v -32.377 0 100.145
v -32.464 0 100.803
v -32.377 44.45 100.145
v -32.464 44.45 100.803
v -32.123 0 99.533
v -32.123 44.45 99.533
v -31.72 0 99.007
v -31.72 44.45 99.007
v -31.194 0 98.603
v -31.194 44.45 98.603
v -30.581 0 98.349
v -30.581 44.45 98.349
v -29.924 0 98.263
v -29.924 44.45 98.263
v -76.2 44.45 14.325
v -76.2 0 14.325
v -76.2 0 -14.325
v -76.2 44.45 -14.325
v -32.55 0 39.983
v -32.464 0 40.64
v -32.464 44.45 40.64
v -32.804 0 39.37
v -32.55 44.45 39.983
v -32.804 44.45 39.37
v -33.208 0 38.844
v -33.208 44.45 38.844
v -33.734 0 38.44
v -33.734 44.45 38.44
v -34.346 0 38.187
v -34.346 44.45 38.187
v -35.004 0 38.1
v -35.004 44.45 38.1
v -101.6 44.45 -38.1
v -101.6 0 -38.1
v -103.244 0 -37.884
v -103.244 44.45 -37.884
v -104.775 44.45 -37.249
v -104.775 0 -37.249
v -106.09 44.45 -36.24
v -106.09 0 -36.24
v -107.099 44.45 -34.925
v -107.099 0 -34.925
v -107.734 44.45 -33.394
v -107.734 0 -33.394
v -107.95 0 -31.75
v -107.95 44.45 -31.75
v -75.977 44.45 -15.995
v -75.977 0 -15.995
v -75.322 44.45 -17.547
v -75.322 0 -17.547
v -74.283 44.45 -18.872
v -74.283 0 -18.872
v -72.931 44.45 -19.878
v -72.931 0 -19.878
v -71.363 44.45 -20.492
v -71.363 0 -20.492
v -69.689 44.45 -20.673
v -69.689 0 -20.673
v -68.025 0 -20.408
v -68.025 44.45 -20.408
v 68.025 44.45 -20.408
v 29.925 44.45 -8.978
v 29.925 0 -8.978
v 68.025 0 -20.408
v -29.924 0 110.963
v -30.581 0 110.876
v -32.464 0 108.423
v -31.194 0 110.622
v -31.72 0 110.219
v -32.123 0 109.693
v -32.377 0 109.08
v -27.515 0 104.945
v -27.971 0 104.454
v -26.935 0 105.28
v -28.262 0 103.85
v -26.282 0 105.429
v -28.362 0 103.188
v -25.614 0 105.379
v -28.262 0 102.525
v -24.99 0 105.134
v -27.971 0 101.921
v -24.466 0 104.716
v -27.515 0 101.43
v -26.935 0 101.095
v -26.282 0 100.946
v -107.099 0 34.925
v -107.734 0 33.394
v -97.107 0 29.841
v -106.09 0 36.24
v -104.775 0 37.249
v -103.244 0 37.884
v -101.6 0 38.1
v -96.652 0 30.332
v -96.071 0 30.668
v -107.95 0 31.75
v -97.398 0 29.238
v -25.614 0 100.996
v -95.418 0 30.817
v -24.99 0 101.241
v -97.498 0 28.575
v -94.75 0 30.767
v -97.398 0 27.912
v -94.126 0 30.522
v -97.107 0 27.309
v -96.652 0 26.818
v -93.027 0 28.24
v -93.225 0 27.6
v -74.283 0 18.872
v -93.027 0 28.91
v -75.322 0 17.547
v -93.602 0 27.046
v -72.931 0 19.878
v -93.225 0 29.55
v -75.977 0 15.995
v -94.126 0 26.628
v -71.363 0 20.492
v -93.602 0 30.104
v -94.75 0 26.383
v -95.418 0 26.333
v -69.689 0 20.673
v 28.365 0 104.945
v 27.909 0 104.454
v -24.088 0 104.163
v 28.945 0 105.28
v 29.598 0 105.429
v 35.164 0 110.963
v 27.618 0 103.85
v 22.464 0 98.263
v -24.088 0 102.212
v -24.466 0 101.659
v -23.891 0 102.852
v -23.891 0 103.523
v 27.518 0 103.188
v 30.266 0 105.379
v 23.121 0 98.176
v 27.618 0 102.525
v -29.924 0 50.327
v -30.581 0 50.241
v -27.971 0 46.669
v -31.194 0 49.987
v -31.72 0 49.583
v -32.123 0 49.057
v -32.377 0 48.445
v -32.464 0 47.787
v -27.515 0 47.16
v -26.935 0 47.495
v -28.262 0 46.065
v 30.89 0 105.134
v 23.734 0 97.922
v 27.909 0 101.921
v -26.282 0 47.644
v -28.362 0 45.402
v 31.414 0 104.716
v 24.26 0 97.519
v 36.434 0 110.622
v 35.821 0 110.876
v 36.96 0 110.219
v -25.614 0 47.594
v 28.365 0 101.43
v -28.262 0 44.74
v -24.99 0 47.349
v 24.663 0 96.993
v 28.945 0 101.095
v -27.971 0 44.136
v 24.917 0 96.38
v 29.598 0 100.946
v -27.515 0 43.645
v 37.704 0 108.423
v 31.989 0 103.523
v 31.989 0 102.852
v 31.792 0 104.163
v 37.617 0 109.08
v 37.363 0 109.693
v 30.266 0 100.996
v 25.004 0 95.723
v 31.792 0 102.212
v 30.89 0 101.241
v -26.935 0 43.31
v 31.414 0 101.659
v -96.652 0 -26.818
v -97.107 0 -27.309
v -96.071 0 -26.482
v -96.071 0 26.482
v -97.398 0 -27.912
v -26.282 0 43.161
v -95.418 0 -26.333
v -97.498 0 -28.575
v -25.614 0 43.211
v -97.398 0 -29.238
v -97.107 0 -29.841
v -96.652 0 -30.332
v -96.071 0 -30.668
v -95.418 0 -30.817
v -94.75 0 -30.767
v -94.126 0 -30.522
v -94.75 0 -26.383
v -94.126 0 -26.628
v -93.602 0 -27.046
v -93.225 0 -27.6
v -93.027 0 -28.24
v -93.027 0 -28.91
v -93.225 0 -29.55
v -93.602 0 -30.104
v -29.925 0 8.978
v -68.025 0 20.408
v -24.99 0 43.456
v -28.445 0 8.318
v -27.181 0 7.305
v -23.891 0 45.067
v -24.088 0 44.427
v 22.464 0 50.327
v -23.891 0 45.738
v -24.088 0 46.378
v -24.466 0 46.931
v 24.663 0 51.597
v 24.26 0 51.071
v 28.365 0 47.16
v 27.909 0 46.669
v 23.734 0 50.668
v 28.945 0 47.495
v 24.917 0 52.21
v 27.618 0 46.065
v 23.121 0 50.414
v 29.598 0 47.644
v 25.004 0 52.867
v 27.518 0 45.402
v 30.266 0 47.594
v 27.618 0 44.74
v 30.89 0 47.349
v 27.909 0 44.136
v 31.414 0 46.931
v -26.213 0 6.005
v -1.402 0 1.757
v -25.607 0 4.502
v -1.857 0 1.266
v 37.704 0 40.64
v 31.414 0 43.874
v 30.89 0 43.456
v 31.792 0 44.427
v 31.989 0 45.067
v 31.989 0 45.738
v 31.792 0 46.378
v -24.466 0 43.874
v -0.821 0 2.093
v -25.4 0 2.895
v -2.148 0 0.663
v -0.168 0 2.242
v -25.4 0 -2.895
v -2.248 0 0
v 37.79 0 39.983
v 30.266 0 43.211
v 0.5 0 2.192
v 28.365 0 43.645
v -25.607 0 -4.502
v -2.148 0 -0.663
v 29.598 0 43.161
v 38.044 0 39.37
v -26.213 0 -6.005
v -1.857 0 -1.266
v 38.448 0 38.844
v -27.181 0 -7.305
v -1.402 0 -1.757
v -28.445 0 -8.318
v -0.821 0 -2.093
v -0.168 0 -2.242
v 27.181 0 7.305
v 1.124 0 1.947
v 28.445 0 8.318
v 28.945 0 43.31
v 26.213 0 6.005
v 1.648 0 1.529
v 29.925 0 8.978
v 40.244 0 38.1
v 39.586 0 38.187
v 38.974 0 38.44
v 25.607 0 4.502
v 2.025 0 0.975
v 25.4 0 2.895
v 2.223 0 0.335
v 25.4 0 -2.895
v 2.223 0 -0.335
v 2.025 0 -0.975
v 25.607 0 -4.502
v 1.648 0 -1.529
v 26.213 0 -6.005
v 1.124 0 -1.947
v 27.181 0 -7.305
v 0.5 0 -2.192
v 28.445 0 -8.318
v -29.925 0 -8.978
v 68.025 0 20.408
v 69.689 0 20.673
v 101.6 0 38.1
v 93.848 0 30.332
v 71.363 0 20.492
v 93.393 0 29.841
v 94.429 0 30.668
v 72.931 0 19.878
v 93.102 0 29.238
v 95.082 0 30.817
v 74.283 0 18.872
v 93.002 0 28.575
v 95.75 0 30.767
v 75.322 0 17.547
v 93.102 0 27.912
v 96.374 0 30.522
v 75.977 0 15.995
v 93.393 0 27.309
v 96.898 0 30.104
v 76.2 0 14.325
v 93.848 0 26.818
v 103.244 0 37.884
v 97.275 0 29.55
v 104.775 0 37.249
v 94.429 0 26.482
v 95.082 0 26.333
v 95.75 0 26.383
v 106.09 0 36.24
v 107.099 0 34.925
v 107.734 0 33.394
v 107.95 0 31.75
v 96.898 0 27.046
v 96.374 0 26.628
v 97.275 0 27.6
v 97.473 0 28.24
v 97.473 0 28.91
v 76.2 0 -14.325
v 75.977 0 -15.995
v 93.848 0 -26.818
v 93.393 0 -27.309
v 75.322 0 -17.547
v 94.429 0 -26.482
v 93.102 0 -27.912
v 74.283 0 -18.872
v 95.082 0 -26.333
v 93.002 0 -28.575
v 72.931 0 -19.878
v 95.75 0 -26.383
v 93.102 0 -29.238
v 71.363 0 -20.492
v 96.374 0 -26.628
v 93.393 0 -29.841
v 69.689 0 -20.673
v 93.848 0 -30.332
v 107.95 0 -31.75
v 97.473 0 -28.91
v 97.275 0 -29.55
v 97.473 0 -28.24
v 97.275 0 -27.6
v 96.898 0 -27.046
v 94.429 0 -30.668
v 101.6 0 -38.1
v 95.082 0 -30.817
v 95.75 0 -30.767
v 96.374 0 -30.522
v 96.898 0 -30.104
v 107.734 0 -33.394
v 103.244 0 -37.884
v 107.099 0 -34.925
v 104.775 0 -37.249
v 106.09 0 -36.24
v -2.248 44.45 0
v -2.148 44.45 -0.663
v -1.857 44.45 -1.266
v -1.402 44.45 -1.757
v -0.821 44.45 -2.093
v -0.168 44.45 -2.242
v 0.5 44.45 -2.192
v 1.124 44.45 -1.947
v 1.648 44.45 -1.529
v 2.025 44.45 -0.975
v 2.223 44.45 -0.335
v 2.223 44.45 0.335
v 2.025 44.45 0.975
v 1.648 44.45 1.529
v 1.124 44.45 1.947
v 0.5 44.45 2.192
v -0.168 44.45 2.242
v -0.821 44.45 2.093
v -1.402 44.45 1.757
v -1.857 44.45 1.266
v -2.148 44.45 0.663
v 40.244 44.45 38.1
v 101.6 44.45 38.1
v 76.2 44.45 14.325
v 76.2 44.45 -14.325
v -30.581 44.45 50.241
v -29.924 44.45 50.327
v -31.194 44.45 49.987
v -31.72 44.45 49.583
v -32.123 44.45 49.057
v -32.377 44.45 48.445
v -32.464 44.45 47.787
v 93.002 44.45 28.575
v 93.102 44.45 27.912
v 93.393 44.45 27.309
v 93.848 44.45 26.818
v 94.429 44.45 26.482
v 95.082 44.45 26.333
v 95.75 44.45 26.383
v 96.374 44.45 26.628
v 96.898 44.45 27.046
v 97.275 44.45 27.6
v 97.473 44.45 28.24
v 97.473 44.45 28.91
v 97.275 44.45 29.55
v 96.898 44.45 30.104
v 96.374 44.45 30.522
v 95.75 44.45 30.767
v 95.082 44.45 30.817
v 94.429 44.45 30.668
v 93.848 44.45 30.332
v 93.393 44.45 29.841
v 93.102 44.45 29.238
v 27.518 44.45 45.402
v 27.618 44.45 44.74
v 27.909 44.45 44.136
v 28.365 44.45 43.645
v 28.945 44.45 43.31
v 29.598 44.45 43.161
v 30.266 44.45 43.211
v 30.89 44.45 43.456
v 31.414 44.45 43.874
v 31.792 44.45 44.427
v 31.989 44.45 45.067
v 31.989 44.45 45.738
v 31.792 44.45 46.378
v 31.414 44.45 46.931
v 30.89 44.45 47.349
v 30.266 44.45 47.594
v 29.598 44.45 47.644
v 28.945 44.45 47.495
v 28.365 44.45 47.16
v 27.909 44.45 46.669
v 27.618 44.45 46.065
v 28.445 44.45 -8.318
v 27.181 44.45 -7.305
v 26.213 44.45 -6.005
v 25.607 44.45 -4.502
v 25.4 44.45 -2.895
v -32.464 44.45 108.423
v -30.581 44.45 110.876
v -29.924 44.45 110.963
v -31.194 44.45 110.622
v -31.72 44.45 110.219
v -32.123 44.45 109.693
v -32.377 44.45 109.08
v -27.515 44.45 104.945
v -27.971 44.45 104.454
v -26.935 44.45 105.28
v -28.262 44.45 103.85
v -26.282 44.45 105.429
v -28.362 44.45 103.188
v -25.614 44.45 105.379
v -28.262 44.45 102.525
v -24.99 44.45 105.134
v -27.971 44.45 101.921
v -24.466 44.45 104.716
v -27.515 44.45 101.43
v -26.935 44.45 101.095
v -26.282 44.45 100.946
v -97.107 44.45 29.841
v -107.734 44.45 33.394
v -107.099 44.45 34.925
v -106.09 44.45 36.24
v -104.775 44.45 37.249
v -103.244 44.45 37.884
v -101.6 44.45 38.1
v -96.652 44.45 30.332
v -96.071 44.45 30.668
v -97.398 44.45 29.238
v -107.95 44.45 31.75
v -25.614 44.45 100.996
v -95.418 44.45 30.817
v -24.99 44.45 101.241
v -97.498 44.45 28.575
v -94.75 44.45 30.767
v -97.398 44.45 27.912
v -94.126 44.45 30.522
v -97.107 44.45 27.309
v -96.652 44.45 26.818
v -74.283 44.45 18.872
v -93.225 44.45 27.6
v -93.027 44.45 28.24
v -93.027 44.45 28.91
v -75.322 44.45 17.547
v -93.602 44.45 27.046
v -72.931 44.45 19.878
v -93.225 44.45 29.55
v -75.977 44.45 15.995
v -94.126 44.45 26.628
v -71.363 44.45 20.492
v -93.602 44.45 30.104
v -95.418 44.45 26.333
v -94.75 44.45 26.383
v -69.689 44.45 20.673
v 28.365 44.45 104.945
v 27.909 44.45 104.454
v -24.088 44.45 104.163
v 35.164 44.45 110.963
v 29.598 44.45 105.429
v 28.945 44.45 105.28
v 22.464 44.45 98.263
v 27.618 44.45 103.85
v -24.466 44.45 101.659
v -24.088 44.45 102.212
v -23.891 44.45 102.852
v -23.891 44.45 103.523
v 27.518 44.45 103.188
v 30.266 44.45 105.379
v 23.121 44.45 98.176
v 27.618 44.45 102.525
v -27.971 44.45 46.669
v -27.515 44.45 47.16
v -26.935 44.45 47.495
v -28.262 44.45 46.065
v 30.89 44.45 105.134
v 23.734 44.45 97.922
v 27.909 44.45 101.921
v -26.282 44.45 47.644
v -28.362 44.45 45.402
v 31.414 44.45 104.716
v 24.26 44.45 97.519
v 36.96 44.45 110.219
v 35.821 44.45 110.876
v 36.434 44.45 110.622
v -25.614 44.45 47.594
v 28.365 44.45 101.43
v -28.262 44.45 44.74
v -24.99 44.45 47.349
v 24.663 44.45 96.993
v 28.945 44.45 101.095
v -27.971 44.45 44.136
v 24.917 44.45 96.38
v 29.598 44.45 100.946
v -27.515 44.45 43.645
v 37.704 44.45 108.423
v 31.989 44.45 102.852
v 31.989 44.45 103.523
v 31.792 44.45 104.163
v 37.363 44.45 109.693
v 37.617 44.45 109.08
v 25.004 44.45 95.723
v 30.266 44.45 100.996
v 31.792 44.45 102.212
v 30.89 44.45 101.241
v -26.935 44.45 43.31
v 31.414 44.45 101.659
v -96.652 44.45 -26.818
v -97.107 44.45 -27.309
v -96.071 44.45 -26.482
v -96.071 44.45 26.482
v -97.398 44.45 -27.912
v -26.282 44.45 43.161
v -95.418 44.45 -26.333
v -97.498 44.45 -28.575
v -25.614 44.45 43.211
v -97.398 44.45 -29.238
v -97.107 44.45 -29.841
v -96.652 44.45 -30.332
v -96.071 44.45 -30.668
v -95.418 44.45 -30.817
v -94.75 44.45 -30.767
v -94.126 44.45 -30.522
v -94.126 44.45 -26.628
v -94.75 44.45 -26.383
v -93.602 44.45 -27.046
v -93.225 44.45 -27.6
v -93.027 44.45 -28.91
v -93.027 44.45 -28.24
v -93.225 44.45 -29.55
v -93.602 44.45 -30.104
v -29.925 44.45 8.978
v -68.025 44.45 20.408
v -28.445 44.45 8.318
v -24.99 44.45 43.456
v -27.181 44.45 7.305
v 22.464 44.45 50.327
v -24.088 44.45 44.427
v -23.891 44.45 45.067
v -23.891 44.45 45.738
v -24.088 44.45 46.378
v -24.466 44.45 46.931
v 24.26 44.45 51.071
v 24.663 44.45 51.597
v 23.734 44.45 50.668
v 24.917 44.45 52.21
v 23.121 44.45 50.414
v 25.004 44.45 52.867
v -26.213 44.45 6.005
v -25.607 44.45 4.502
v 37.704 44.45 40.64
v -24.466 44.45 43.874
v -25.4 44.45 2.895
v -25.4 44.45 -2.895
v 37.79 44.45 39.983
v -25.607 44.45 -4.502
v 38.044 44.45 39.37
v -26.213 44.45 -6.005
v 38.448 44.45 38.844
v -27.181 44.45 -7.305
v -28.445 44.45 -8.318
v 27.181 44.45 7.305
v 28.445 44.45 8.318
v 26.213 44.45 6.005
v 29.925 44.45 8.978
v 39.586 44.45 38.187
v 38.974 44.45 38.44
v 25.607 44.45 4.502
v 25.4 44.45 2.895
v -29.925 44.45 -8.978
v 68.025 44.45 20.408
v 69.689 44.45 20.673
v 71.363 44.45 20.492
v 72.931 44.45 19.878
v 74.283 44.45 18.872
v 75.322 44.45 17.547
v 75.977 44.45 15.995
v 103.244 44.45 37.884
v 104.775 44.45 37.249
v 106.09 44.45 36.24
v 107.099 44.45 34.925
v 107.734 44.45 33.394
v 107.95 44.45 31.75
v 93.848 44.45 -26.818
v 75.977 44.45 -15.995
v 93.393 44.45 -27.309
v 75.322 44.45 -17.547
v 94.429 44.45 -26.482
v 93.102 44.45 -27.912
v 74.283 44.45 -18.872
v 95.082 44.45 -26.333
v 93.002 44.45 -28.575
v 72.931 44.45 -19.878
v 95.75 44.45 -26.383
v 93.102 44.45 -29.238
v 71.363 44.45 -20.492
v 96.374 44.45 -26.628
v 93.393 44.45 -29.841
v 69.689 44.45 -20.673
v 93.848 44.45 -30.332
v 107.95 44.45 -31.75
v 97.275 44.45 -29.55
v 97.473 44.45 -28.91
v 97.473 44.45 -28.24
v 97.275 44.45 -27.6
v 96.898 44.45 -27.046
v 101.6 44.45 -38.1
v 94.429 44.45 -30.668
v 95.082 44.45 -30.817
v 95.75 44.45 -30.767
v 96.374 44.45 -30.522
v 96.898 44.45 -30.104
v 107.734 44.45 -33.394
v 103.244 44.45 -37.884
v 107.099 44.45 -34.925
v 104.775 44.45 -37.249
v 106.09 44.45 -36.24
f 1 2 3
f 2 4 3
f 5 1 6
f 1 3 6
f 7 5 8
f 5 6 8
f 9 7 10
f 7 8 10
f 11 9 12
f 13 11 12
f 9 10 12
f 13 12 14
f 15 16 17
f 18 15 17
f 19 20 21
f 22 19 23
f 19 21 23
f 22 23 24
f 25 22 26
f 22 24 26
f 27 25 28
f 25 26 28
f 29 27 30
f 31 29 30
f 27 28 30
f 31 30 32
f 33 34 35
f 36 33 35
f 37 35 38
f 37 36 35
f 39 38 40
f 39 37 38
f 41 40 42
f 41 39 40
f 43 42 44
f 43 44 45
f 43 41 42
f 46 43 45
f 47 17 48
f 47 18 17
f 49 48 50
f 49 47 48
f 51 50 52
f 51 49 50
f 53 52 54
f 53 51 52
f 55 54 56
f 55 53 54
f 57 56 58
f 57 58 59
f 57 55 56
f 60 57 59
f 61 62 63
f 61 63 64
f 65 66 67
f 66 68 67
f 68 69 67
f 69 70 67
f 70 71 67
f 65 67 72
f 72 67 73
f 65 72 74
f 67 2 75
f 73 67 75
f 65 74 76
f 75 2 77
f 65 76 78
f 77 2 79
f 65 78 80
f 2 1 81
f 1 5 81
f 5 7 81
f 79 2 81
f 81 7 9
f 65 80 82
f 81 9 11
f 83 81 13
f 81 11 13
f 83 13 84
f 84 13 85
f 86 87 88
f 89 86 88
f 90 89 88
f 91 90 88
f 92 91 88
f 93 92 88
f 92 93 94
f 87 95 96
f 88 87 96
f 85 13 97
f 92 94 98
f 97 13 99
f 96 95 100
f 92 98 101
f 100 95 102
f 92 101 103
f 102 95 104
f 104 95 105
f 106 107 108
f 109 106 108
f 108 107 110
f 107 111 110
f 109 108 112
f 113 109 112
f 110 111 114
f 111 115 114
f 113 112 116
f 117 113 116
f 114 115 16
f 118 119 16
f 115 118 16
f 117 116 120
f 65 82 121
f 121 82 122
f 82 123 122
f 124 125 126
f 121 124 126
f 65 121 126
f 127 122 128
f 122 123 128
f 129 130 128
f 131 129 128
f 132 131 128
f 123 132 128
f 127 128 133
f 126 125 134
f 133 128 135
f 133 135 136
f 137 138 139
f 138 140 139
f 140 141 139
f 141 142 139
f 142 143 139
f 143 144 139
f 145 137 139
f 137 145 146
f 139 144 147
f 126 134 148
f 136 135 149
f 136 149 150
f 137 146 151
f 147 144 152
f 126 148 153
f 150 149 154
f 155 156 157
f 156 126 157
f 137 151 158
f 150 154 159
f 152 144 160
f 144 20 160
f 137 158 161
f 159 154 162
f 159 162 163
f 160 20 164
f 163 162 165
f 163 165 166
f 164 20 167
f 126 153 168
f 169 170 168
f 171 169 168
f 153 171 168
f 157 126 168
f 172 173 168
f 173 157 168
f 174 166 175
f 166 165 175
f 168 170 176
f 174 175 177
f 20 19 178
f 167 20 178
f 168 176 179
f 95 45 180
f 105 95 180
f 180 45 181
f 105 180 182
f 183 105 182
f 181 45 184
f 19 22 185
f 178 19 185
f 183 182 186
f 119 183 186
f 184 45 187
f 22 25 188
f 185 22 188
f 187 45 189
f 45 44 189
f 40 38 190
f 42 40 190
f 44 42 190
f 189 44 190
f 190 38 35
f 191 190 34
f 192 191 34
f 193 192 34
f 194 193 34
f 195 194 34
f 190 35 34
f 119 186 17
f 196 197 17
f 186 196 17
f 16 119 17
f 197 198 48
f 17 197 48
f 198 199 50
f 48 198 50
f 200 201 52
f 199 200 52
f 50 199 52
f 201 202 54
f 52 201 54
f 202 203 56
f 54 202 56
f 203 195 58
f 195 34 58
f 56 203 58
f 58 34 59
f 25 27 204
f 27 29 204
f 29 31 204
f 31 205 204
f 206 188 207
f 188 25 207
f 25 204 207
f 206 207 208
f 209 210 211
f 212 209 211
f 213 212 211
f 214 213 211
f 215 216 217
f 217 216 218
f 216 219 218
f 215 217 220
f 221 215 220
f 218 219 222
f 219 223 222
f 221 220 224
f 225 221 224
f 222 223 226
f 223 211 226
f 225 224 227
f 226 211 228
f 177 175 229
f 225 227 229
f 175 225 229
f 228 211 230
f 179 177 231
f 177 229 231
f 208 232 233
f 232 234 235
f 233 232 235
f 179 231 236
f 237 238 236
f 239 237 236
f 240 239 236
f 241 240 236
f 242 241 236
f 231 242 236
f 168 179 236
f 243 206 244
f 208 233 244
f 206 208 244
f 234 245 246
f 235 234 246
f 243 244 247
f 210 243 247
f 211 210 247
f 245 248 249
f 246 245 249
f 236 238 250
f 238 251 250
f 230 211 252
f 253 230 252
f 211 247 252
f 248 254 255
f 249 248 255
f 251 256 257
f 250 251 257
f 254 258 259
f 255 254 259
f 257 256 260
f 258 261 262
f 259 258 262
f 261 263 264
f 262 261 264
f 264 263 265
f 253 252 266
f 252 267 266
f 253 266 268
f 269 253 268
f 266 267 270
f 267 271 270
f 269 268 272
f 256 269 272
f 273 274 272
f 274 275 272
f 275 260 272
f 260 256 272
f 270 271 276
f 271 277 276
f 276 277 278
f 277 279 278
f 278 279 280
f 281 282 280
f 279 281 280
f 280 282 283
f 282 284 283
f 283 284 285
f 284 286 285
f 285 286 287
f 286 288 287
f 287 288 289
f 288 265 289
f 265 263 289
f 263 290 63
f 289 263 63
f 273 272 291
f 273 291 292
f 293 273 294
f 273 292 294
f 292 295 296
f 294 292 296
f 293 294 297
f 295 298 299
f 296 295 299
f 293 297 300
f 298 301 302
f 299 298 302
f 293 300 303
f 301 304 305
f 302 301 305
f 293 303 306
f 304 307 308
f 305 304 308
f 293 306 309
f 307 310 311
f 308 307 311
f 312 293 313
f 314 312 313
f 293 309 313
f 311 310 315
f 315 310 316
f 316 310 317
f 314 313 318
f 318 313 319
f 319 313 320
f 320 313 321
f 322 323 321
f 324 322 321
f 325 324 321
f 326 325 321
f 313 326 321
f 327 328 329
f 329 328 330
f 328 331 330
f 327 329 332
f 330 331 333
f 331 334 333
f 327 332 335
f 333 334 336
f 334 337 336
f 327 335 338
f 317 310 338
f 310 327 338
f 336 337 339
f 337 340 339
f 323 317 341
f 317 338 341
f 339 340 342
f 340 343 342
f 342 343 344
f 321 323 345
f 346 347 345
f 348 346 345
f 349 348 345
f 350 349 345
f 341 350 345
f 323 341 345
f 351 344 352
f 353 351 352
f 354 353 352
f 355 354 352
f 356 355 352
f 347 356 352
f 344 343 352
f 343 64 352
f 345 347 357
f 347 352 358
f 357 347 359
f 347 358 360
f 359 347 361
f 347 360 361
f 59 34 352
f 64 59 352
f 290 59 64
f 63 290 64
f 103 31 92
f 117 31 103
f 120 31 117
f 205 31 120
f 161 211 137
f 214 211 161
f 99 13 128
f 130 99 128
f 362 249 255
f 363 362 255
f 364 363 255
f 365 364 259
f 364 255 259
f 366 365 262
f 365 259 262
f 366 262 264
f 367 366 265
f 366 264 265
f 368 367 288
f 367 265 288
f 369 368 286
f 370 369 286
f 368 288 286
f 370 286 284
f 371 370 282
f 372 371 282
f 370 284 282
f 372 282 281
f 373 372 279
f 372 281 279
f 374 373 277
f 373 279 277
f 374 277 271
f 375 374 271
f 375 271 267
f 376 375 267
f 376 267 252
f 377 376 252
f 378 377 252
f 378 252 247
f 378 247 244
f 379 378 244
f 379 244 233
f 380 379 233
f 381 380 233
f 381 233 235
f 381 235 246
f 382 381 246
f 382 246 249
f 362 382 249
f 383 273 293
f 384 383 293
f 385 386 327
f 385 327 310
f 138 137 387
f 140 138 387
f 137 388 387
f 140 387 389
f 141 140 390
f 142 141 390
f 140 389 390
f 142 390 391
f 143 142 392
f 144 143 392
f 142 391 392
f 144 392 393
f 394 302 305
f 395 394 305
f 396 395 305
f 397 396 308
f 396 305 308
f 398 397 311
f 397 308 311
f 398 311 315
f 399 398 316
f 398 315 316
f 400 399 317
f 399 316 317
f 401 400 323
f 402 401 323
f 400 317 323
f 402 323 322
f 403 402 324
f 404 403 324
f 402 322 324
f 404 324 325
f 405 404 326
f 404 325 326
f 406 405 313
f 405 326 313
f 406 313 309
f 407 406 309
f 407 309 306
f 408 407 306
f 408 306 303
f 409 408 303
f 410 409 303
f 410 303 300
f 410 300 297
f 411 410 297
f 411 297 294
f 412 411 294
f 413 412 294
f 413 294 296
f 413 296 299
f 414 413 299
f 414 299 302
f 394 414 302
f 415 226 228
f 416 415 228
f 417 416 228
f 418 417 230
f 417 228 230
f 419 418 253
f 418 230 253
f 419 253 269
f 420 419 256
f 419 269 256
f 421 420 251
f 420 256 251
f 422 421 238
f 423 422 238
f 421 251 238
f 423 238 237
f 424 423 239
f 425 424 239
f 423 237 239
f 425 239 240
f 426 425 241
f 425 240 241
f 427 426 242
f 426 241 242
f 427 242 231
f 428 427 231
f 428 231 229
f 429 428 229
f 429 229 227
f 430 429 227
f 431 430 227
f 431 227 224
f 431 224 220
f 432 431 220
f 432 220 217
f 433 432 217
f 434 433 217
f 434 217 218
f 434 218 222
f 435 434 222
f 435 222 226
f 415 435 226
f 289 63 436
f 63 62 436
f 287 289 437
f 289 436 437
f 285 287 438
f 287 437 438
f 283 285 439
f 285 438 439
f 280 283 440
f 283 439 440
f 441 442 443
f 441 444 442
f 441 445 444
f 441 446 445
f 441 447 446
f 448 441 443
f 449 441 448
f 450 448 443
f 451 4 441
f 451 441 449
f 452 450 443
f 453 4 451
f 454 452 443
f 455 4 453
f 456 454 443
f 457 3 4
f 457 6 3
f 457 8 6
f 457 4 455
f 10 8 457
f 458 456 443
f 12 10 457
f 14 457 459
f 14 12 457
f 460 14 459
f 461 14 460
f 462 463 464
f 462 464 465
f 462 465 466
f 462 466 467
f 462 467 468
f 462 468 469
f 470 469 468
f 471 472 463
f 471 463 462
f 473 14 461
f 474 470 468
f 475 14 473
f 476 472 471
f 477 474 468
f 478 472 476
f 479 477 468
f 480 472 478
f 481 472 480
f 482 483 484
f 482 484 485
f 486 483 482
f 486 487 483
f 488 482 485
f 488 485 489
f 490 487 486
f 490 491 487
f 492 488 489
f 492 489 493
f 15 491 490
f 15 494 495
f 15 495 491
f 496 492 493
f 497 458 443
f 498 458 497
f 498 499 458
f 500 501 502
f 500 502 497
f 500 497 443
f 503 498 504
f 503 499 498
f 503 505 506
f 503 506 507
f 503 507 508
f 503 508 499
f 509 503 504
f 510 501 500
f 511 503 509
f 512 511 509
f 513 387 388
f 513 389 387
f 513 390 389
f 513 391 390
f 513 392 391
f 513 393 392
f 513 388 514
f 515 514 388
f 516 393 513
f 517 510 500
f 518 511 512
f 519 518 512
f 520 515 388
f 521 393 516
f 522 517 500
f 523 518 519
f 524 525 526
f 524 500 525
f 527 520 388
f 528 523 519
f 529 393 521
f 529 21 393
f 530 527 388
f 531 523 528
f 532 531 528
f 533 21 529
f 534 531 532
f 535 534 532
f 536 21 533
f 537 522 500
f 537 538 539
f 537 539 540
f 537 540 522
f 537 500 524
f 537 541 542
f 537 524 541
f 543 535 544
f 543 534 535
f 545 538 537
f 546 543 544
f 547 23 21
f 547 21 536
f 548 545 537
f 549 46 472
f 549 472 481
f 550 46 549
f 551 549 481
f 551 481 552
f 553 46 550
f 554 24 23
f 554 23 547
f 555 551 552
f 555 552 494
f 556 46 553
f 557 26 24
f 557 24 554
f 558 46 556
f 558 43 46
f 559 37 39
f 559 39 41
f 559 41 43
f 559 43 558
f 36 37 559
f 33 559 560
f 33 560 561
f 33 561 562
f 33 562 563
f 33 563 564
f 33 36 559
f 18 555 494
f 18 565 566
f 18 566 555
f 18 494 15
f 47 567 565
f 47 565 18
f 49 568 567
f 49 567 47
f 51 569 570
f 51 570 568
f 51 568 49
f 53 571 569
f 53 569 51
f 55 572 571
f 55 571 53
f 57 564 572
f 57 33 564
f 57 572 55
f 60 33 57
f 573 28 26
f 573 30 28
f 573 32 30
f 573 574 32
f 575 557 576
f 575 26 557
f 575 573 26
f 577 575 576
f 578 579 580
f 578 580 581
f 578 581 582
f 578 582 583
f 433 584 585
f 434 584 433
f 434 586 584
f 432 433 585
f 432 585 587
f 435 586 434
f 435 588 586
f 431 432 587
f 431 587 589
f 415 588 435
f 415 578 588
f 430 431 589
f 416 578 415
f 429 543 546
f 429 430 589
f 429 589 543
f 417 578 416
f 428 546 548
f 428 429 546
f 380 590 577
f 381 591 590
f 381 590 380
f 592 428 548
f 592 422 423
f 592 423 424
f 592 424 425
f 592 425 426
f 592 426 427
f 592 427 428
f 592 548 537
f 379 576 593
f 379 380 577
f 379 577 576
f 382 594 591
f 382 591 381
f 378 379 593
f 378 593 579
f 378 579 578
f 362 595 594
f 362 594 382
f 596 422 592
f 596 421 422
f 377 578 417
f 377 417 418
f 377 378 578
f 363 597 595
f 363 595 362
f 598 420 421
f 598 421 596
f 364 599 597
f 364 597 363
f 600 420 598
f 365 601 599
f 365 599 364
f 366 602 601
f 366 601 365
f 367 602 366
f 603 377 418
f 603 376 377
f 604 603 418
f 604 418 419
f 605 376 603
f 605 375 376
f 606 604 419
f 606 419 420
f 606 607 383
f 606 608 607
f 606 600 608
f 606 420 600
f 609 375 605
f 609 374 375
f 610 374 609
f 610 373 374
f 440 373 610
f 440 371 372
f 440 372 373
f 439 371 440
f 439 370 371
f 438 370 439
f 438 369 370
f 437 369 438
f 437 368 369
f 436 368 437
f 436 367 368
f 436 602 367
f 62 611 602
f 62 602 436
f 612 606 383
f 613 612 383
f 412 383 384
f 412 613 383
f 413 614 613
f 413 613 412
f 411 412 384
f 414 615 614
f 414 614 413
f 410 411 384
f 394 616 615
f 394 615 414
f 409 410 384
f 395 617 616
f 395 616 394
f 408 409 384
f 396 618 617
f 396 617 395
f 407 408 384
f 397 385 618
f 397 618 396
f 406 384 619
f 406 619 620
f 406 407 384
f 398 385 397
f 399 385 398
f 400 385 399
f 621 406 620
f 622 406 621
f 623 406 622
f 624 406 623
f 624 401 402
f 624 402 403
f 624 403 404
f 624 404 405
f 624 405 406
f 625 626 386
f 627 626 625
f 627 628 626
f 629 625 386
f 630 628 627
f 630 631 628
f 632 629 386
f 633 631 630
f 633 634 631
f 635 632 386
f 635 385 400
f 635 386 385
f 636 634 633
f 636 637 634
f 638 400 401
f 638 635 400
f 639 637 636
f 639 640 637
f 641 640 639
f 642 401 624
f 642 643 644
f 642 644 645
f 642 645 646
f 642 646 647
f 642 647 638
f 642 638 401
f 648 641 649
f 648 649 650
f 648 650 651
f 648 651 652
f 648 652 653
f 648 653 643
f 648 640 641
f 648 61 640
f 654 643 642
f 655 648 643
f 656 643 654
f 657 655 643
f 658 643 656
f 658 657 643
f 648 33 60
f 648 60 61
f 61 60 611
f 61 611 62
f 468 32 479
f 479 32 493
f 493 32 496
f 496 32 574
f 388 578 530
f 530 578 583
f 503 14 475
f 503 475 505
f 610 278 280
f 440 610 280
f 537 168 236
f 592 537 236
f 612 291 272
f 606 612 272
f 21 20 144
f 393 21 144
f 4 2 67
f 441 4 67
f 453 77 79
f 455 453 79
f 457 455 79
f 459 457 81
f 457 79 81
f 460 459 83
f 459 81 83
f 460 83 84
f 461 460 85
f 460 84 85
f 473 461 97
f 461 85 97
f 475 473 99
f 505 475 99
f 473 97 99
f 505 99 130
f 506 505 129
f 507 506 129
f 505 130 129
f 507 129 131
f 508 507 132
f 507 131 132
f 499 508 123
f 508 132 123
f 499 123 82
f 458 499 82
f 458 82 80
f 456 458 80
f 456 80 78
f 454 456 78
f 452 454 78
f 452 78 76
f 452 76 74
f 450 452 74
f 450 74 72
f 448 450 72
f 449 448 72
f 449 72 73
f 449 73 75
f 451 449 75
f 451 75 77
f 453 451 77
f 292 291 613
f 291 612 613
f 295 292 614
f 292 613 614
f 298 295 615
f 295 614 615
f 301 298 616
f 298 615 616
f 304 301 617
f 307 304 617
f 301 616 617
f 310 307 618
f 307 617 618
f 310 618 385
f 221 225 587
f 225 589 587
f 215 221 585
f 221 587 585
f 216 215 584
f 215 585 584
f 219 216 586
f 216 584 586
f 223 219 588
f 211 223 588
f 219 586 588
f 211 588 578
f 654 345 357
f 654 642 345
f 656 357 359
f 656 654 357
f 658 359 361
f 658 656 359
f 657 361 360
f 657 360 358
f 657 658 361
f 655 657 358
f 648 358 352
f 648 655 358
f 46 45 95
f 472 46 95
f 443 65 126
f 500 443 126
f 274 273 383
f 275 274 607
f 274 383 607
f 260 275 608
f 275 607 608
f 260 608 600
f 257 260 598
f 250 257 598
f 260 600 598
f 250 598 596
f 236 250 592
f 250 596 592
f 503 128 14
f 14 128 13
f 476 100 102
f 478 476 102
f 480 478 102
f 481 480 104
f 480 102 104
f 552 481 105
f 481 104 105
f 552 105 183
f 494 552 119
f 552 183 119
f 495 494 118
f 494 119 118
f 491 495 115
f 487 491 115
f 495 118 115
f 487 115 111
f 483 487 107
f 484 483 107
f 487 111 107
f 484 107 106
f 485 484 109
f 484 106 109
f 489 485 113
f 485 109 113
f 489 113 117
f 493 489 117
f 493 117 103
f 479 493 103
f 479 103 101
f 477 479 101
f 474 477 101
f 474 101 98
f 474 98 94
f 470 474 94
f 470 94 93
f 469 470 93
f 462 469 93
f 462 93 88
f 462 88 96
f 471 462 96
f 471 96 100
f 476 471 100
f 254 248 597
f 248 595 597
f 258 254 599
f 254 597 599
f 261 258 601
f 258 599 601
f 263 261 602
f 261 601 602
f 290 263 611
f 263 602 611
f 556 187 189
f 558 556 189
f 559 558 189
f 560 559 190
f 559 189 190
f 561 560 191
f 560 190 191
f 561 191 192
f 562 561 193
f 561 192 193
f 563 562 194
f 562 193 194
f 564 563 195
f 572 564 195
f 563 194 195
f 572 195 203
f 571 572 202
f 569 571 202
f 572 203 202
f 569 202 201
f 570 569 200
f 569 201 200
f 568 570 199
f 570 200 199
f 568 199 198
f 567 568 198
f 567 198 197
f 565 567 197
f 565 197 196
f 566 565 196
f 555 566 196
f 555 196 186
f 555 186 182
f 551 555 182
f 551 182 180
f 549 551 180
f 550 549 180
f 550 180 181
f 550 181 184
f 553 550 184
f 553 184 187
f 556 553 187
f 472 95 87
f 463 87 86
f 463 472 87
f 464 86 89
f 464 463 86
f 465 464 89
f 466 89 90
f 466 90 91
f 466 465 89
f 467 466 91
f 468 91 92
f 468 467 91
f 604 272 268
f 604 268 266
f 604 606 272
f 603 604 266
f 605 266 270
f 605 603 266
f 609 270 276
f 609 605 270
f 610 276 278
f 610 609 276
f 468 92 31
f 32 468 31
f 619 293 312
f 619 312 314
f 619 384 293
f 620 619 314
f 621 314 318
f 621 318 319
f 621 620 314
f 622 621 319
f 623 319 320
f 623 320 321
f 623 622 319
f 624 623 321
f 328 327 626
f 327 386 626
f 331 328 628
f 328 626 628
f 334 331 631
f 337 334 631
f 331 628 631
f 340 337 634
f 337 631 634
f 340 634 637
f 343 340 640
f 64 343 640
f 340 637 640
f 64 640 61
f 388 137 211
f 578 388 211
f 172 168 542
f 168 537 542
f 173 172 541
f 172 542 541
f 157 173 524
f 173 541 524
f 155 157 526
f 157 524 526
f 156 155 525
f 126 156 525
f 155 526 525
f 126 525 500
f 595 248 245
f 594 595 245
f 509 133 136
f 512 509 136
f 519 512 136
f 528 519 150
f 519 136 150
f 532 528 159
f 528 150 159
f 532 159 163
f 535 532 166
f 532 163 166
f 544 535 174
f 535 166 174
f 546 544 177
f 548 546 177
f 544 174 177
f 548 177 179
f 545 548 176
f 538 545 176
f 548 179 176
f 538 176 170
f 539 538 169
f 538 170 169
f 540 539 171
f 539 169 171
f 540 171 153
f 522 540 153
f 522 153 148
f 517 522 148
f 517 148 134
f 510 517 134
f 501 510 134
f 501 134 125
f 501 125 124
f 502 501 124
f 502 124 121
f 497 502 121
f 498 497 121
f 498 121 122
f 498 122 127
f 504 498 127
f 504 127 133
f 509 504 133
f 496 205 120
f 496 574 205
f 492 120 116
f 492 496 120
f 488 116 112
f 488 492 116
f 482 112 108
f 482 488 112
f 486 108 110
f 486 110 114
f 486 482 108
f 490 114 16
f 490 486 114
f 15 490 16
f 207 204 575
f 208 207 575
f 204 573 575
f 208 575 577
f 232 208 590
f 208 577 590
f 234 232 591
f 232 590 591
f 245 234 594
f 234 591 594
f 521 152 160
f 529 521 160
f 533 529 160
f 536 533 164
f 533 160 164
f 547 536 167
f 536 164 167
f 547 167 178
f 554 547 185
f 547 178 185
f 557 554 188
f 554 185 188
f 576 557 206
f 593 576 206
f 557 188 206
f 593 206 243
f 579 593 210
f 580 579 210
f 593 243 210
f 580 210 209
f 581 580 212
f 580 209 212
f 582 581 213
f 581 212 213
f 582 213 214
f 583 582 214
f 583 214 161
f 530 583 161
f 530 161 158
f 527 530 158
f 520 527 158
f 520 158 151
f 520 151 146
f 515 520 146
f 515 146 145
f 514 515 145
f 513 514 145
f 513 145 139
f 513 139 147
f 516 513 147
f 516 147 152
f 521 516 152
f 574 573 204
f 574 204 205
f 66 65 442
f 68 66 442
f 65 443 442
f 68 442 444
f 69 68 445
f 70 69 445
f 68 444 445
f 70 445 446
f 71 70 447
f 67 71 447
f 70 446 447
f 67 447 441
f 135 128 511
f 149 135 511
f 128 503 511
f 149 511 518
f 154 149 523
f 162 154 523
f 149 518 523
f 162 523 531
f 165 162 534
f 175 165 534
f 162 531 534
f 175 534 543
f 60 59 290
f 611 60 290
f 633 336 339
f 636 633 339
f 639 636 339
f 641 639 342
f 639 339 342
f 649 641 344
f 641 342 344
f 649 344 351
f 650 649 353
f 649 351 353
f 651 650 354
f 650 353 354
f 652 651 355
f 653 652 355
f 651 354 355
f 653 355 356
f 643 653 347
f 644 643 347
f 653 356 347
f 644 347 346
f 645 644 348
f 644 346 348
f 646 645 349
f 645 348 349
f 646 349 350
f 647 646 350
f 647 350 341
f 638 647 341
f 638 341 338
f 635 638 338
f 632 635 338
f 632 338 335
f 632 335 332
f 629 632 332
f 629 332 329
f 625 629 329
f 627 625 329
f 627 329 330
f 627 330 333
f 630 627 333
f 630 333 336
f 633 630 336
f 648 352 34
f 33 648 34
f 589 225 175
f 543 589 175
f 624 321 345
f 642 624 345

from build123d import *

# Parameters (mm, degrees)
BOSS_EXTRUDE1_DEPTH   = 44.45
FILLET1_R             = 6.35
F_8_CLEARANCE_HOLE1_D = 4.4958
FILLET2_R             = 2.54


with BuildPart() as part:
    # Sketch1 → Boss-Extrude1 (new body)
    with BuildSketch(Plane(origin=(0, 0, 0), x_dir=(1, 0, 0), z_dir=(0, 1, 0))):
        Polygon((37.70376, -38.1), (107.95, -38.1), (107.95, 38.1), (-107.95, 38.1), (-107.95, -38.1), (-32.46374, -38.1), (-32.46374, -50.327357955), (25.00376, -50.327357955), (25.00376, -98.262642045), (-32.46374, -98.262642045), (-32.46374, -110.962642045), (37.70376, -110.962642045), align=None)
        Polygon((-76.2, -22.86), (-76.2, 22.86), (-25.4, 7.62), (-25.4, -7.62), align=None, mode=Mode.SUBTRACT)
        Polygon((25.4, -7.62), (25.4, 7.62), (76.2, 22.86), (76.2, -22.86), align=None, mode=Mode.SUBTRACT)
    extrude(amount=BOSS_EXTRUDE1_DEPTH)

    # Fillet1
    fillet1_edges = [part.edges().sort_by_distance(p)[0] for p in [
        (-107.95, 22.225, -38.1),
        (107.95, 22.225, -38.1),
        (107.95, 22.225, 38.1),
        (-107.95, 22.225, 38.1),
        (-76.2, 22.225, -22.86),
        (-76.2, 22.225, 22.86),
        (-25.4, 22.225, 7.62),
        (-25.4, 22.225, -7.62),
        (25.4, 22.225, -7.62),
        (25.4, 22.225, 7.62),
        (76.2, 22.225, 22.86),
        (76.2, 22.225, -22.86),
    ]]
    fillet(fillet1_edges, radius=FILLET1_R)

    # #8 Clearance Hole1 (through all)
    with Locations(Plane(origin=(0, 44.45, 0), x_dir=(1, 0, 0), z_dir=(0, 1, 0))):
        with Locations((95.25, 28.575), (95.25, -28.575), (-95.25, 28.575), (-95.25, -28.575), (0, 0), (-26.11374, -45.4025), (29.76626, -45.4025), (29.76626, -103.1875), (-26.11374, -103.1875)):
            Hole(F_8_CLEARANCE_HOLE1_D / 2)

    # Fillet2
    fillet2_edges = [part.edges().sort_by_distance(p)[0] for p in [
        (37.70376, 22.225, 38.1),
        (37.70376, 22.225, 110.962642045),
        (-32.46374, 22.225, 110.962642045),
        (-32.46374, 22.225, 98.262642045),
        (25.00376, 22.225, 98.262642045),
        (25.00376, 22.225, 50.327357955),
        (-32.46374, 22.225, 50.327357955),
        (-32.46374, 22.225, 38.1),
    ]]
    fillet(fillet2_edges, radius=FILLET2_R)


solid = part.part
